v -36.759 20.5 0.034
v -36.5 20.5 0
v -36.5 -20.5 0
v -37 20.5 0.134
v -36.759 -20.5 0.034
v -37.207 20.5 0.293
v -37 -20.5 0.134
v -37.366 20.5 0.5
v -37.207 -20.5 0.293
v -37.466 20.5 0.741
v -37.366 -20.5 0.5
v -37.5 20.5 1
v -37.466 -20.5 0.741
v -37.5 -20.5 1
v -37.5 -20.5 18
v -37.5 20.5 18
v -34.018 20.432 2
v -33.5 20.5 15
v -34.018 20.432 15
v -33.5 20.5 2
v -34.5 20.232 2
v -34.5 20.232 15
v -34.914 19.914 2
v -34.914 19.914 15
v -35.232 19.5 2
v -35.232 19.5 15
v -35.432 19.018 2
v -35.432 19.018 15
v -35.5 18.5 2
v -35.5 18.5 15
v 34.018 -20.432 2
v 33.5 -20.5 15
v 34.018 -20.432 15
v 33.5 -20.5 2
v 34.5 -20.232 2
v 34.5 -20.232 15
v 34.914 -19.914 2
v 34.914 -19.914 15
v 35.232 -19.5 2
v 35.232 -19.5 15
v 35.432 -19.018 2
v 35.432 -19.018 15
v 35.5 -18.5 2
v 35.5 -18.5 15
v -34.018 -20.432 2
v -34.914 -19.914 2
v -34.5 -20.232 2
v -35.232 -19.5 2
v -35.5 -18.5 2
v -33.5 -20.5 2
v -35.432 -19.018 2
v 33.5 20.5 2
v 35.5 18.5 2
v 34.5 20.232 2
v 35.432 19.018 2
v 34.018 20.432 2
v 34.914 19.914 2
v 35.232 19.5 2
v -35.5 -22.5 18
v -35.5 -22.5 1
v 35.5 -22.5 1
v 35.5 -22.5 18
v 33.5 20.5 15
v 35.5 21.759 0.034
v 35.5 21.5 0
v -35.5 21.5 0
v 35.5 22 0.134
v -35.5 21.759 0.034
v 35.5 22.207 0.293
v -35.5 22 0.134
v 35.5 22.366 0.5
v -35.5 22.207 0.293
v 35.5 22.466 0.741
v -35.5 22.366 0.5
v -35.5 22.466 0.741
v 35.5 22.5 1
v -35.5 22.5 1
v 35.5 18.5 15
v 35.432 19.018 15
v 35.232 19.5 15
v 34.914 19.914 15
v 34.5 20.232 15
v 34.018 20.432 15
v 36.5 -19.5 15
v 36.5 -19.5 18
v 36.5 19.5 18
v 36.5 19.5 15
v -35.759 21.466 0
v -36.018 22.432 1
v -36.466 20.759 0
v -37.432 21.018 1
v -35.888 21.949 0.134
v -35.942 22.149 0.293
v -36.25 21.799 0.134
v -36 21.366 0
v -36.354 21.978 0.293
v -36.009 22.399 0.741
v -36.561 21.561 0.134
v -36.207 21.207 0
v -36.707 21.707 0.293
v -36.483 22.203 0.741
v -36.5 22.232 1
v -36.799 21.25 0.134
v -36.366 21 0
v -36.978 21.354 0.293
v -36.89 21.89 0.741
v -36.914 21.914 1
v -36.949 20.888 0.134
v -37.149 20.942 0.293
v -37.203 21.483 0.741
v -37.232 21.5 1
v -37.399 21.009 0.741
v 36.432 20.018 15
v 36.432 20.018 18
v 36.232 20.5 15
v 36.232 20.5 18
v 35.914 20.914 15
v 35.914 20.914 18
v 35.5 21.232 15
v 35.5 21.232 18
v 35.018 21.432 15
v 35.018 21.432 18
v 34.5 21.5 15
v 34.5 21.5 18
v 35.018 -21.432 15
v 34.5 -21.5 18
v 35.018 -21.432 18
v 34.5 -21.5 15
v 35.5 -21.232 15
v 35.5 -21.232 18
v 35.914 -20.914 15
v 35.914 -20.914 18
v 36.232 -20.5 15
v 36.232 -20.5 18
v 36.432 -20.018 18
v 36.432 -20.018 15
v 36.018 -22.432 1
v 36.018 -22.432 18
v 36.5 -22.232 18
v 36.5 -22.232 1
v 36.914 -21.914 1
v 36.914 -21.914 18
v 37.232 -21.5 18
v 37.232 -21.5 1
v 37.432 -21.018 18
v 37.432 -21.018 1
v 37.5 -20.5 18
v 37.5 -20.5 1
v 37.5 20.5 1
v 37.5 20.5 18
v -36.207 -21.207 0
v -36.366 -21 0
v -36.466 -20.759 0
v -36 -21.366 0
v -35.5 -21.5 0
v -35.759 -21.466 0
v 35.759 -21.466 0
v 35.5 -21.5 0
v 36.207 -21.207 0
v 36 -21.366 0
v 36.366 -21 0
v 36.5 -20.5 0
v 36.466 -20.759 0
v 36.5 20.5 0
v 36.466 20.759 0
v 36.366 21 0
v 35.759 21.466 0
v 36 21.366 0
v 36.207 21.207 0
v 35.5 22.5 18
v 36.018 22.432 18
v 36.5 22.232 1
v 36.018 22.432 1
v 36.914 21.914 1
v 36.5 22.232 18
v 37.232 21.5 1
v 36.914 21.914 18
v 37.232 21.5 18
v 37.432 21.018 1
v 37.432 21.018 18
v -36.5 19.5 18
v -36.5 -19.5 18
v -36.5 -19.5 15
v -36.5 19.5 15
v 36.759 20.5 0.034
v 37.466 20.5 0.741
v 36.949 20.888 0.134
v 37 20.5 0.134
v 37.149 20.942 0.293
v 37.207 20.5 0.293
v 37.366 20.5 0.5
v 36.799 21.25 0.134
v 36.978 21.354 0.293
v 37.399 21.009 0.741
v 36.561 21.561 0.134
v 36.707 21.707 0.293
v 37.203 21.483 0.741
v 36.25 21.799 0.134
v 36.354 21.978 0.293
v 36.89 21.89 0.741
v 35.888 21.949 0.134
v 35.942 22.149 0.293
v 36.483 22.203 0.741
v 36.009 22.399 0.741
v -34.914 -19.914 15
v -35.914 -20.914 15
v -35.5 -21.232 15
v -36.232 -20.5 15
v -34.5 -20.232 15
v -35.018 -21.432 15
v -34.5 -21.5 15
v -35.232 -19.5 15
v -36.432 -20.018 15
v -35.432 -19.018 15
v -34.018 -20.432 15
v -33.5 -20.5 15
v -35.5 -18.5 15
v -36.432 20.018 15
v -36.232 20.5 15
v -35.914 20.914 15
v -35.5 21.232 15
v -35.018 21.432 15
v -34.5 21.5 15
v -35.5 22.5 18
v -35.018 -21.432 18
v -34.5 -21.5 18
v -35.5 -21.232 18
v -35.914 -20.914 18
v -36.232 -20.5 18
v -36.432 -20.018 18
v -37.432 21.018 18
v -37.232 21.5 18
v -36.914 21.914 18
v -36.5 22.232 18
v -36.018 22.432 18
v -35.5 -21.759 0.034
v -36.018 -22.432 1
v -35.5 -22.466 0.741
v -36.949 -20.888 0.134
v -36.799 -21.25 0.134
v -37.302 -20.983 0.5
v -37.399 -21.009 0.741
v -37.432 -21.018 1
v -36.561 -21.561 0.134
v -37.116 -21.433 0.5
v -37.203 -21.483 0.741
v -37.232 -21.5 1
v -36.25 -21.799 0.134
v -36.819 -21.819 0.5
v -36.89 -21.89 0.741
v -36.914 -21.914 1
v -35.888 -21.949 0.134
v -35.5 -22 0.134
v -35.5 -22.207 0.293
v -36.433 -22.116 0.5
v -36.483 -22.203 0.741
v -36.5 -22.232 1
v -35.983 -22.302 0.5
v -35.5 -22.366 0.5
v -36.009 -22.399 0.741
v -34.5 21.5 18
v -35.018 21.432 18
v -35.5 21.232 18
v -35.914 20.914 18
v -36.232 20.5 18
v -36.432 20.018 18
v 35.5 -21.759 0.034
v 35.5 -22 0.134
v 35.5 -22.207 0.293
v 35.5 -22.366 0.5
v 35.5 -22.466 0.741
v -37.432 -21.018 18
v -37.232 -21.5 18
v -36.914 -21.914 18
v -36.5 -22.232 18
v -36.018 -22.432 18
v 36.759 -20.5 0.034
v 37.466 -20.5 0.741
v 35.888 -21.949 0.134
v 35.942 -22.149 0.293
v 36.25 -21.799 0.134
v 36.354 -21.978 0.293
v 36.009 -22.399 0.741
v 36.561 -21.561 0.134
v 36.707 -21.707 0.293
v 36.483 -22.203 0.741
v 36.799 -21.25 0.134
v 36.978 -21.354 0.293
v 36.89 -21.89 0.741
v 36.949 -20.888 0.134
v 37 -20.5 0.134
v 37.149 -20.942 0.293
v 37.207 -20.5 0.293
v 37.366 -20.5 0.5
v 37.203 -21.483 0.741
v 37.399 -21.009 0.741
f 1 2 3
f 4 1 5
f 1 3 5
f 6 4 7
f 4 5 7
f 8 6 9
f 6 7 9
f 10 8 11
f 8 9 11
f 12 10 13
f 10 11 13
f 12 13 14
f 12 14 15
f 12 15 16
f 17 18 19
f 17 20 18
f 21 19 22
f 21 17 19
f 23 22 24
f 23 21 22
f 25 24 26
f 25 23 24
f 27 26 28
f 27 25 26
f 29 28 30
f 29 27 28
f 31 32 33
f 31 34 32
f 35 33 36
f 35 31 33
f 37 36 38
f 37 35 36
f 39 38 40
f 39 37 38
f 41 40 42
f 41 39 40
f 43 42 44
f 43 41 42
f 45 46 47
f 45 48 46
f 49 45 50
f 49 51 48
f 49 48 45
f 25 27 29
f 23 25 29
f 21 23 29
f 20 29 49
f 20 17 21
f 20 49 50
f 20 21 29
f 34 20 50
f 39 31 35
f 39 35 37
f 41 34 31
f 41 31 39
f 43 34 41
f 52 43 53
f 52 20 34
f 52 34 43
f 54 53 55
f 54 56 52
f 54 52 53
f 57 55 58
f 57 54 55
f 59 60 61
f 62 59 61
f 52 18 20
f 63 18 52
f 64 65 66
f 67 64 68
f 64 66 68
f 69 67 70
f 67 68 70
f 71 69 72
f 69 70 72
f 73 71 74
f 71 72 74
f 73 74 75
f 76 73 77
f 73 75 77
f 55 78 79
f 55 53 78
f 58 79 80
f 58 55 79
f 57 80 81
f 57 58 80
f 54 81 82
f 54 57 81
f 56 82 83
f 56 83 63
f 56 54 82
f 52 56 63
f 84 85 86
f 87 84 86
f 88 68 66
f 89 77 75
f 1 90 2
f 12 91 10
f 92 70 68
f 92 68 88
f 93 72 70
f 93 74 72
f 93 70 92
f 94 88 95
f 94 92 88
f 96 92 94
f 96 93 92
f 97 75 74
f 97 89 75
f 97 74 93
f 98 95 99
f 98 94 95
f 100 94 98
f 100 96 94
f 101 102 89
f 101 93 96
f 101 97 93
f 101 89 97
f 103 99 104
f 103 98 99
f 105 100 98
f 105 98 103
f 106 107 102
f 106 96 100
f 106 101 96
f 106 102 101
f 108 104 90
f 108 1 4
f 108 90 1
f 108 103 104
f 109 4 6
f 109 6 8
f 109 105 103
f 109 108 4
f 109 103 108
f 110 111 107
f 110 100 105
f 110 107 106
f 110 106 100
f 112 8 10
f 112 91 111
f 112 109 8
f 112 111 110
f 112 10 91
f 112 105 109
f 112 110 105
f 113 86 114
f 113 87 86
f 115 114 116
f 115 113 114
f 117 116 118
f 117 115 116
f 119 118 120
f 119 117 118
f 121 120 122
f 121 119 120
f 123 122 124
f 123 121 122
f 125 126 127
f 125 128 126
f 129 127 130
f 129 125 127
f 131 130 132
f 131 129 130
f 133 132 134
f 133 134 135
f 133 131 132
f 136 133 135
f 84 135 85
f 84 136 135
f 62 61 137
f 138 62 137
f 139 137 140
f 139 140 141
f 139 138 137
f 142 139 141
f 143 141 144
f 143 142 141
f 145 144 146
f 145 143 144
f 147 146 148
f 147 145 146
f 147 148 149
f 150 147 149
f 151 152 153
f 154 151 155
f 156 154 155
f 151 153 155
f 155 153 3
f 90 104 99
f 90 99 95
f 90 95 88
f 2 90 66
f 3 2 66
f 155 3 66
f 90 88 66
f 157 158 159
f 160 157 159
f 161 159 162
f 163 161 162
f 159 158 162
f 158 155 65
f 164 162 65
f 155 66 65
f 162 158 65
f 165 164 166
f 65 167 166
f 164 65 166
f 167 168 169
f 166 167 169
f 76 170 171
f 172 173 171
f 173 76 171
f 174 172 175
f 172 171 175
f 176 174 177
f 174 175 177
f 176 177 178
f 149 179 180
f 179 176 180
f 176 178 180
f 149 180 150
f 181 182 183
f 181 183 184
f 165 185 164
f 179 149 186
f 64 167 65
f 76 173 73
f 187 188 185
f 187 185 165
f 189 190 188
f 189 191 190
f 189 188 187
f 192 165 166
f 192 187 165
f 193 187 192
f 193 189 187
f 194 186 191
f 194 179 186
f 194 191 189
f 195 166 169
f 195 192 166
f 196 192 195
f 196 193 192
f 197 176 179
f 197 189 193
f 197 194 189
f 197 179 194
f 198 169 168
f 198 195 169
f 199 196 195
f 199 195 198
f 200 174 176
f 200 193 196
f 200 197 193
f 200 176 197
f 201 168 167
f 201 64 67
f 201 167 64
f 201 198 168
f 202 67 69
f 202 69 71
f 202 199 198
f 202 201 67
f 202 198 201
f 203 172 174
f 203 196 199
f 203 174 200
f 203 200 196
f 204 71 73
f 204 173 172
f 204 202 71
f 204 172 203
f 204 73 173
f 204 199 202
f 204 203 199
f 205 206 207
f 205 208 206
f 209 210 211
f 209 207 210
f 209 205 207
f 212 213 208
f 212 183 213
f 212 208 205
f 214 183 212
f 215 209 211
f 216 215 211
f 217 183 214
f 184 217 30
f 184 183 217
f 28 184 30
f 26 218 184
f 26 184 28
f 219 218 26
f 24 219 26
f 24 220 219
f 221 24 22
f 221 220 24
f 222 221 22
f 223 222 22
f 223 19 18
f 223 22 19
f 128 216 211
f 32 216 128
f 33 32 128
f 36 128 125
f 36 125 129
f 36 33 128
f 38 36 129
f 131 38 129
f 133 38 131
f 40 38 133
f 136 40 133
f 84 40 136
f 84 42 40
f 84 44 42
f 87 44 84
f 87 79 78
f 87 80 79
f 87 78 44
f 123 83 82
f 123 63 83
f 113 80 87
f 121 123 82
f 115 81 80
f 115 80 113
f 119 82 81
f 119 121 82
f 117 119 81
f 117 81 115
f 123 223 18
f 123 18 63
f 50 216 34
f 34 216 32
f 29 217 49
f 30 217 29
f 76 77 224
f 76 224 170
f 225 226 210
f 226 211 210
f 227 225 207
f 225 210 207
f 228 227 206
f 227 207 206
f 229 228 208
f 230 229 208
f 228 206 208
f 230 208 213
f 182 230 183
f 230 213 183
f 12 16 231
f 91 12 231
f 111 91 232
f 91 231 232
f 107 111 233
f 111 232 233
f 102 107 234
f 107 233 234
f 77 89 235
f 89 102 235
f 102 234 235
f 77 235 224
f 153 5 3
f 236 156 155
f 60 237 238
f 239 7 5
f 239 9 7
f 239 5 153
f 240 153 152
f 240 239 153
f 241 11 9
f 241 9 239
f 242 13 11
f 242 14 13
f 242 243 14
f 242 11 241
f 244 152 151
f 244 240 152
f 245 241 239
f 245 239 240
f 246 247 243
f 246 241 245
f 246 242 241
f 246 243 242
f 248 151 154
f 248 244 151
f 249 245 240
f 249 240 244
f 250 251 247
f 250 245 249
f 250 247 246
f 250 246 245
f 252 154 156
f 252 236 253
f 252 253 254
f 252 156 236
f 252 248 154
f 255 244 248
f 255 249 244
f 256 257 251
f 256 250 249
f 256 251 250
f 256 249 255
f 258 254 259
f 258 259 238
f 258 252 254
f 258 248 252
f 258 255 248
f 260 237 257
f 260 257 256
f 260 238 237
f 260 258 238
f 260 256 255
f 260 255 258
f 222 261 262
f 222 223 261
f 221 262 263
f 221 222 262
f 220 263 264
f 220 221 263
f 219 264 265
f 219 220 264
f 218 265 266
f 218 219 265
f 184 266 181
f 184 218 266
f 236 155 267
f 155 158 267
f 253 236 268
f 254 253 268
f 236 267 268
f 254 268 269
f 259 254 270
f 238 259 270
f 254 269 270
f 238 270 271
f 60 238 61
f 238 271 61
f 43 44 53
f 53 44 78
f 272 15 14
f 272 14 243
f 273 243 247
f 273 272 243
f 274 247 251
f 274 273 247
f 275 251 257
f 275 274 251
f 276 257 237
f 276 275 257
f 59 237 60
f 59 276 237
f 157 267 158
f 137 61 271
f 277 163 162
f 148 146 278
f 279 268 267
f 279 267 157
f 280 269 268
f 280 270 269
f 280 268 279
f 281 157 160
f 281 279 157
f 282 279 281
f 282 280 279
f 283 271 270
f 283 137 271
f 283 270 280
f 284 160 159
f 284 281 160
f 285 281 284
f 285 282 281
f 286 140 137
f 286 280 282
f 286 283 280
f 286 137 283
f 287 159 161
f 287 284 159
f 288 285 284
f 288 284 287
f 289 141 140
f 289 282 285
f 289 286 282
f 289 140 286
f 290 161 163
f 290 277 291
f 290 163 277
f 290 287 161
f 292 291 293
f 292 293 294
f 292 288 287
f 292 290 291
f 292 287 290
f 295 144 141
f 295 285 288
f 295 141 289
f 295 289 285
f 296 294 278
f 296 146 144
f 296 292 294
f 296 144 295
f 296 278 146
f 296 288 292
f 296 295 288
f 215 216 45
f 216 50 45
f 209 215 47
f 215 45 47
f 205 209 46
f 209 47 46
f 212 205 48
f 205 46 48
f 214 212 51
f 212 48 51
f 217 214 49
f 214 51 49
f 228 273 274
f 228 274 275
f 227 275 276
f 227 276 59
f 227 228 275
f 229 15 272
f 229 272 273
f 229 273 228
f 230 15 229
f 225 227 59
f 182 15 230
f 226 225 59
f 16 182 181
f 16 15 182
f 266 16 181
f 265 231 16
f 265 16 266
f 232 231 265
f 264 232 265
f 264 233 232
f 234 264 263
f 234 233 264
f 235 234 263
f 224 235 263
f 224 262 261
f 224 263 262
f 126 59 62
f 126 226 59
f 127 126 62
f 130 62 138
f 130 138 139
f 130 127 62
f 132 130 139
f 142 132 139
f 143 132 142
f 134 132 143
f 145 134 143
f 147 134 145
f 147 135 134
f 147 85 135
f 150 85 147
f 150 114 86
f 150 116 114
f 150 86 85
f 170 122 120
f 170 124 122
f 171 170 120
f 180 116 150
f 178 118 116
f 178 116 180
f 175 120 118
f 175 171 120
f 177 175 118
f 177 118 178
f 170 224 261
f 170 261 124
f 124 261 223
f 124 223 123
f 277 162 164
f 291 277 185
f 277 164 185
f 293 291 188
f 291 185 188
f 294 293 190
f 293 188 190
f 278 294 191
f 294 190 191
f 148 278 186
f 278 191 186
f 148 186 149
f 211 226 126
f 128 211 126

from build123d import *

# Parameters (mm, degrees)
SKETCH_1_W          = 75
SKETCH_1_H          = 45
EXTRUDE_1_DEPTH     = 18
SKETCH_2_W          = 71
SKETCH_2_H          = 41
CUT_EXTRUDE_1_DEPTH = 16
SKETCH_3_W          = 73
SKETCH_3_H          = 43
SKETCH_3_W_2        = 71
SKETCH_3_H_2        = 41
CUT_EXTRUDE_2_DEPTH = 3
FILLET_1_R          = 2
FILLET_2_R          = 1


with BuildPart() as part:
    # 草图1 → 凸台-拉伸1 (new body)
    with BuildSketch(Plane.XY):
        Rectangle(SKETCH_1_W, SKETCH_1_H)
    extrude(amount=EXTRUDE_1_DEPTH)

    # 草图2 → 切除-拉伸1 (cut)
    with BuildSketch(Plane.XY.offset(18)):
        Rectangle(SKETCH_2_W, SKETCH_2_H)
    extrude(amount=-CUT_EXTRUDE_1_DEPTH, mode=Mode.SUBTRACT)

    # 草图3 → 切除-拉伸2 (cut)
    with BuildSketch(Plane.XY.offset(18)):
        Rectangle(SKETCH_3_W, SKETCH_3_H)
        Rectangle(SKETCH_3_W_2, SKETCH_3_H_2, mode=Mode.SUBTRACT)
    extrude(amount=-CUT_EXTRUDE_2_DEPTH, mode=Mode.SUBTRACT)

    # 圆角1
    fillet_1_edges = [part.edges().sort_by_distance(p)[0] for p in [
        (-35.5, 20.5, 8.5),
        (35.5, 20.5, 8.5),
        (35.5, -20.5, 8.5),
        (-35.5, -20.5, 8.5),
        (-36.5, -21.5, 16.5),
        (-36.5, 21.5, 16.5),
        (36.5, 21.5, 16.5),
        (36.5, -21.5, 16.5),
        (-37.5, 22.5, 9),
        (37.5, 22.5, 9),
        (37.5, -22.5, 9),
        (-37.5, -22.5, 9),
    ]]
    fillet(fillet_1_edges, radius=FILLET_1_R)

    # 圆角2
    fillet_2_edges = [part.edges().sort_by_distance(p)[0] for p in [
        (0, -22.5, 0),
        (-37.5, 0, 0),
        (0, 22.5, 0),
        (37.5, 0, 0),
        (-36.914213562, 21.914213562, 0),
        (36.914213562, 21.914213562, 0),
        (36.914213562, -21.914213562, 0),
        (-36.914213562, -21.914213562, 0),
    ]]
    fillet(fillet_2_edges, radius=FILLET_2_R)


solid = part.part
